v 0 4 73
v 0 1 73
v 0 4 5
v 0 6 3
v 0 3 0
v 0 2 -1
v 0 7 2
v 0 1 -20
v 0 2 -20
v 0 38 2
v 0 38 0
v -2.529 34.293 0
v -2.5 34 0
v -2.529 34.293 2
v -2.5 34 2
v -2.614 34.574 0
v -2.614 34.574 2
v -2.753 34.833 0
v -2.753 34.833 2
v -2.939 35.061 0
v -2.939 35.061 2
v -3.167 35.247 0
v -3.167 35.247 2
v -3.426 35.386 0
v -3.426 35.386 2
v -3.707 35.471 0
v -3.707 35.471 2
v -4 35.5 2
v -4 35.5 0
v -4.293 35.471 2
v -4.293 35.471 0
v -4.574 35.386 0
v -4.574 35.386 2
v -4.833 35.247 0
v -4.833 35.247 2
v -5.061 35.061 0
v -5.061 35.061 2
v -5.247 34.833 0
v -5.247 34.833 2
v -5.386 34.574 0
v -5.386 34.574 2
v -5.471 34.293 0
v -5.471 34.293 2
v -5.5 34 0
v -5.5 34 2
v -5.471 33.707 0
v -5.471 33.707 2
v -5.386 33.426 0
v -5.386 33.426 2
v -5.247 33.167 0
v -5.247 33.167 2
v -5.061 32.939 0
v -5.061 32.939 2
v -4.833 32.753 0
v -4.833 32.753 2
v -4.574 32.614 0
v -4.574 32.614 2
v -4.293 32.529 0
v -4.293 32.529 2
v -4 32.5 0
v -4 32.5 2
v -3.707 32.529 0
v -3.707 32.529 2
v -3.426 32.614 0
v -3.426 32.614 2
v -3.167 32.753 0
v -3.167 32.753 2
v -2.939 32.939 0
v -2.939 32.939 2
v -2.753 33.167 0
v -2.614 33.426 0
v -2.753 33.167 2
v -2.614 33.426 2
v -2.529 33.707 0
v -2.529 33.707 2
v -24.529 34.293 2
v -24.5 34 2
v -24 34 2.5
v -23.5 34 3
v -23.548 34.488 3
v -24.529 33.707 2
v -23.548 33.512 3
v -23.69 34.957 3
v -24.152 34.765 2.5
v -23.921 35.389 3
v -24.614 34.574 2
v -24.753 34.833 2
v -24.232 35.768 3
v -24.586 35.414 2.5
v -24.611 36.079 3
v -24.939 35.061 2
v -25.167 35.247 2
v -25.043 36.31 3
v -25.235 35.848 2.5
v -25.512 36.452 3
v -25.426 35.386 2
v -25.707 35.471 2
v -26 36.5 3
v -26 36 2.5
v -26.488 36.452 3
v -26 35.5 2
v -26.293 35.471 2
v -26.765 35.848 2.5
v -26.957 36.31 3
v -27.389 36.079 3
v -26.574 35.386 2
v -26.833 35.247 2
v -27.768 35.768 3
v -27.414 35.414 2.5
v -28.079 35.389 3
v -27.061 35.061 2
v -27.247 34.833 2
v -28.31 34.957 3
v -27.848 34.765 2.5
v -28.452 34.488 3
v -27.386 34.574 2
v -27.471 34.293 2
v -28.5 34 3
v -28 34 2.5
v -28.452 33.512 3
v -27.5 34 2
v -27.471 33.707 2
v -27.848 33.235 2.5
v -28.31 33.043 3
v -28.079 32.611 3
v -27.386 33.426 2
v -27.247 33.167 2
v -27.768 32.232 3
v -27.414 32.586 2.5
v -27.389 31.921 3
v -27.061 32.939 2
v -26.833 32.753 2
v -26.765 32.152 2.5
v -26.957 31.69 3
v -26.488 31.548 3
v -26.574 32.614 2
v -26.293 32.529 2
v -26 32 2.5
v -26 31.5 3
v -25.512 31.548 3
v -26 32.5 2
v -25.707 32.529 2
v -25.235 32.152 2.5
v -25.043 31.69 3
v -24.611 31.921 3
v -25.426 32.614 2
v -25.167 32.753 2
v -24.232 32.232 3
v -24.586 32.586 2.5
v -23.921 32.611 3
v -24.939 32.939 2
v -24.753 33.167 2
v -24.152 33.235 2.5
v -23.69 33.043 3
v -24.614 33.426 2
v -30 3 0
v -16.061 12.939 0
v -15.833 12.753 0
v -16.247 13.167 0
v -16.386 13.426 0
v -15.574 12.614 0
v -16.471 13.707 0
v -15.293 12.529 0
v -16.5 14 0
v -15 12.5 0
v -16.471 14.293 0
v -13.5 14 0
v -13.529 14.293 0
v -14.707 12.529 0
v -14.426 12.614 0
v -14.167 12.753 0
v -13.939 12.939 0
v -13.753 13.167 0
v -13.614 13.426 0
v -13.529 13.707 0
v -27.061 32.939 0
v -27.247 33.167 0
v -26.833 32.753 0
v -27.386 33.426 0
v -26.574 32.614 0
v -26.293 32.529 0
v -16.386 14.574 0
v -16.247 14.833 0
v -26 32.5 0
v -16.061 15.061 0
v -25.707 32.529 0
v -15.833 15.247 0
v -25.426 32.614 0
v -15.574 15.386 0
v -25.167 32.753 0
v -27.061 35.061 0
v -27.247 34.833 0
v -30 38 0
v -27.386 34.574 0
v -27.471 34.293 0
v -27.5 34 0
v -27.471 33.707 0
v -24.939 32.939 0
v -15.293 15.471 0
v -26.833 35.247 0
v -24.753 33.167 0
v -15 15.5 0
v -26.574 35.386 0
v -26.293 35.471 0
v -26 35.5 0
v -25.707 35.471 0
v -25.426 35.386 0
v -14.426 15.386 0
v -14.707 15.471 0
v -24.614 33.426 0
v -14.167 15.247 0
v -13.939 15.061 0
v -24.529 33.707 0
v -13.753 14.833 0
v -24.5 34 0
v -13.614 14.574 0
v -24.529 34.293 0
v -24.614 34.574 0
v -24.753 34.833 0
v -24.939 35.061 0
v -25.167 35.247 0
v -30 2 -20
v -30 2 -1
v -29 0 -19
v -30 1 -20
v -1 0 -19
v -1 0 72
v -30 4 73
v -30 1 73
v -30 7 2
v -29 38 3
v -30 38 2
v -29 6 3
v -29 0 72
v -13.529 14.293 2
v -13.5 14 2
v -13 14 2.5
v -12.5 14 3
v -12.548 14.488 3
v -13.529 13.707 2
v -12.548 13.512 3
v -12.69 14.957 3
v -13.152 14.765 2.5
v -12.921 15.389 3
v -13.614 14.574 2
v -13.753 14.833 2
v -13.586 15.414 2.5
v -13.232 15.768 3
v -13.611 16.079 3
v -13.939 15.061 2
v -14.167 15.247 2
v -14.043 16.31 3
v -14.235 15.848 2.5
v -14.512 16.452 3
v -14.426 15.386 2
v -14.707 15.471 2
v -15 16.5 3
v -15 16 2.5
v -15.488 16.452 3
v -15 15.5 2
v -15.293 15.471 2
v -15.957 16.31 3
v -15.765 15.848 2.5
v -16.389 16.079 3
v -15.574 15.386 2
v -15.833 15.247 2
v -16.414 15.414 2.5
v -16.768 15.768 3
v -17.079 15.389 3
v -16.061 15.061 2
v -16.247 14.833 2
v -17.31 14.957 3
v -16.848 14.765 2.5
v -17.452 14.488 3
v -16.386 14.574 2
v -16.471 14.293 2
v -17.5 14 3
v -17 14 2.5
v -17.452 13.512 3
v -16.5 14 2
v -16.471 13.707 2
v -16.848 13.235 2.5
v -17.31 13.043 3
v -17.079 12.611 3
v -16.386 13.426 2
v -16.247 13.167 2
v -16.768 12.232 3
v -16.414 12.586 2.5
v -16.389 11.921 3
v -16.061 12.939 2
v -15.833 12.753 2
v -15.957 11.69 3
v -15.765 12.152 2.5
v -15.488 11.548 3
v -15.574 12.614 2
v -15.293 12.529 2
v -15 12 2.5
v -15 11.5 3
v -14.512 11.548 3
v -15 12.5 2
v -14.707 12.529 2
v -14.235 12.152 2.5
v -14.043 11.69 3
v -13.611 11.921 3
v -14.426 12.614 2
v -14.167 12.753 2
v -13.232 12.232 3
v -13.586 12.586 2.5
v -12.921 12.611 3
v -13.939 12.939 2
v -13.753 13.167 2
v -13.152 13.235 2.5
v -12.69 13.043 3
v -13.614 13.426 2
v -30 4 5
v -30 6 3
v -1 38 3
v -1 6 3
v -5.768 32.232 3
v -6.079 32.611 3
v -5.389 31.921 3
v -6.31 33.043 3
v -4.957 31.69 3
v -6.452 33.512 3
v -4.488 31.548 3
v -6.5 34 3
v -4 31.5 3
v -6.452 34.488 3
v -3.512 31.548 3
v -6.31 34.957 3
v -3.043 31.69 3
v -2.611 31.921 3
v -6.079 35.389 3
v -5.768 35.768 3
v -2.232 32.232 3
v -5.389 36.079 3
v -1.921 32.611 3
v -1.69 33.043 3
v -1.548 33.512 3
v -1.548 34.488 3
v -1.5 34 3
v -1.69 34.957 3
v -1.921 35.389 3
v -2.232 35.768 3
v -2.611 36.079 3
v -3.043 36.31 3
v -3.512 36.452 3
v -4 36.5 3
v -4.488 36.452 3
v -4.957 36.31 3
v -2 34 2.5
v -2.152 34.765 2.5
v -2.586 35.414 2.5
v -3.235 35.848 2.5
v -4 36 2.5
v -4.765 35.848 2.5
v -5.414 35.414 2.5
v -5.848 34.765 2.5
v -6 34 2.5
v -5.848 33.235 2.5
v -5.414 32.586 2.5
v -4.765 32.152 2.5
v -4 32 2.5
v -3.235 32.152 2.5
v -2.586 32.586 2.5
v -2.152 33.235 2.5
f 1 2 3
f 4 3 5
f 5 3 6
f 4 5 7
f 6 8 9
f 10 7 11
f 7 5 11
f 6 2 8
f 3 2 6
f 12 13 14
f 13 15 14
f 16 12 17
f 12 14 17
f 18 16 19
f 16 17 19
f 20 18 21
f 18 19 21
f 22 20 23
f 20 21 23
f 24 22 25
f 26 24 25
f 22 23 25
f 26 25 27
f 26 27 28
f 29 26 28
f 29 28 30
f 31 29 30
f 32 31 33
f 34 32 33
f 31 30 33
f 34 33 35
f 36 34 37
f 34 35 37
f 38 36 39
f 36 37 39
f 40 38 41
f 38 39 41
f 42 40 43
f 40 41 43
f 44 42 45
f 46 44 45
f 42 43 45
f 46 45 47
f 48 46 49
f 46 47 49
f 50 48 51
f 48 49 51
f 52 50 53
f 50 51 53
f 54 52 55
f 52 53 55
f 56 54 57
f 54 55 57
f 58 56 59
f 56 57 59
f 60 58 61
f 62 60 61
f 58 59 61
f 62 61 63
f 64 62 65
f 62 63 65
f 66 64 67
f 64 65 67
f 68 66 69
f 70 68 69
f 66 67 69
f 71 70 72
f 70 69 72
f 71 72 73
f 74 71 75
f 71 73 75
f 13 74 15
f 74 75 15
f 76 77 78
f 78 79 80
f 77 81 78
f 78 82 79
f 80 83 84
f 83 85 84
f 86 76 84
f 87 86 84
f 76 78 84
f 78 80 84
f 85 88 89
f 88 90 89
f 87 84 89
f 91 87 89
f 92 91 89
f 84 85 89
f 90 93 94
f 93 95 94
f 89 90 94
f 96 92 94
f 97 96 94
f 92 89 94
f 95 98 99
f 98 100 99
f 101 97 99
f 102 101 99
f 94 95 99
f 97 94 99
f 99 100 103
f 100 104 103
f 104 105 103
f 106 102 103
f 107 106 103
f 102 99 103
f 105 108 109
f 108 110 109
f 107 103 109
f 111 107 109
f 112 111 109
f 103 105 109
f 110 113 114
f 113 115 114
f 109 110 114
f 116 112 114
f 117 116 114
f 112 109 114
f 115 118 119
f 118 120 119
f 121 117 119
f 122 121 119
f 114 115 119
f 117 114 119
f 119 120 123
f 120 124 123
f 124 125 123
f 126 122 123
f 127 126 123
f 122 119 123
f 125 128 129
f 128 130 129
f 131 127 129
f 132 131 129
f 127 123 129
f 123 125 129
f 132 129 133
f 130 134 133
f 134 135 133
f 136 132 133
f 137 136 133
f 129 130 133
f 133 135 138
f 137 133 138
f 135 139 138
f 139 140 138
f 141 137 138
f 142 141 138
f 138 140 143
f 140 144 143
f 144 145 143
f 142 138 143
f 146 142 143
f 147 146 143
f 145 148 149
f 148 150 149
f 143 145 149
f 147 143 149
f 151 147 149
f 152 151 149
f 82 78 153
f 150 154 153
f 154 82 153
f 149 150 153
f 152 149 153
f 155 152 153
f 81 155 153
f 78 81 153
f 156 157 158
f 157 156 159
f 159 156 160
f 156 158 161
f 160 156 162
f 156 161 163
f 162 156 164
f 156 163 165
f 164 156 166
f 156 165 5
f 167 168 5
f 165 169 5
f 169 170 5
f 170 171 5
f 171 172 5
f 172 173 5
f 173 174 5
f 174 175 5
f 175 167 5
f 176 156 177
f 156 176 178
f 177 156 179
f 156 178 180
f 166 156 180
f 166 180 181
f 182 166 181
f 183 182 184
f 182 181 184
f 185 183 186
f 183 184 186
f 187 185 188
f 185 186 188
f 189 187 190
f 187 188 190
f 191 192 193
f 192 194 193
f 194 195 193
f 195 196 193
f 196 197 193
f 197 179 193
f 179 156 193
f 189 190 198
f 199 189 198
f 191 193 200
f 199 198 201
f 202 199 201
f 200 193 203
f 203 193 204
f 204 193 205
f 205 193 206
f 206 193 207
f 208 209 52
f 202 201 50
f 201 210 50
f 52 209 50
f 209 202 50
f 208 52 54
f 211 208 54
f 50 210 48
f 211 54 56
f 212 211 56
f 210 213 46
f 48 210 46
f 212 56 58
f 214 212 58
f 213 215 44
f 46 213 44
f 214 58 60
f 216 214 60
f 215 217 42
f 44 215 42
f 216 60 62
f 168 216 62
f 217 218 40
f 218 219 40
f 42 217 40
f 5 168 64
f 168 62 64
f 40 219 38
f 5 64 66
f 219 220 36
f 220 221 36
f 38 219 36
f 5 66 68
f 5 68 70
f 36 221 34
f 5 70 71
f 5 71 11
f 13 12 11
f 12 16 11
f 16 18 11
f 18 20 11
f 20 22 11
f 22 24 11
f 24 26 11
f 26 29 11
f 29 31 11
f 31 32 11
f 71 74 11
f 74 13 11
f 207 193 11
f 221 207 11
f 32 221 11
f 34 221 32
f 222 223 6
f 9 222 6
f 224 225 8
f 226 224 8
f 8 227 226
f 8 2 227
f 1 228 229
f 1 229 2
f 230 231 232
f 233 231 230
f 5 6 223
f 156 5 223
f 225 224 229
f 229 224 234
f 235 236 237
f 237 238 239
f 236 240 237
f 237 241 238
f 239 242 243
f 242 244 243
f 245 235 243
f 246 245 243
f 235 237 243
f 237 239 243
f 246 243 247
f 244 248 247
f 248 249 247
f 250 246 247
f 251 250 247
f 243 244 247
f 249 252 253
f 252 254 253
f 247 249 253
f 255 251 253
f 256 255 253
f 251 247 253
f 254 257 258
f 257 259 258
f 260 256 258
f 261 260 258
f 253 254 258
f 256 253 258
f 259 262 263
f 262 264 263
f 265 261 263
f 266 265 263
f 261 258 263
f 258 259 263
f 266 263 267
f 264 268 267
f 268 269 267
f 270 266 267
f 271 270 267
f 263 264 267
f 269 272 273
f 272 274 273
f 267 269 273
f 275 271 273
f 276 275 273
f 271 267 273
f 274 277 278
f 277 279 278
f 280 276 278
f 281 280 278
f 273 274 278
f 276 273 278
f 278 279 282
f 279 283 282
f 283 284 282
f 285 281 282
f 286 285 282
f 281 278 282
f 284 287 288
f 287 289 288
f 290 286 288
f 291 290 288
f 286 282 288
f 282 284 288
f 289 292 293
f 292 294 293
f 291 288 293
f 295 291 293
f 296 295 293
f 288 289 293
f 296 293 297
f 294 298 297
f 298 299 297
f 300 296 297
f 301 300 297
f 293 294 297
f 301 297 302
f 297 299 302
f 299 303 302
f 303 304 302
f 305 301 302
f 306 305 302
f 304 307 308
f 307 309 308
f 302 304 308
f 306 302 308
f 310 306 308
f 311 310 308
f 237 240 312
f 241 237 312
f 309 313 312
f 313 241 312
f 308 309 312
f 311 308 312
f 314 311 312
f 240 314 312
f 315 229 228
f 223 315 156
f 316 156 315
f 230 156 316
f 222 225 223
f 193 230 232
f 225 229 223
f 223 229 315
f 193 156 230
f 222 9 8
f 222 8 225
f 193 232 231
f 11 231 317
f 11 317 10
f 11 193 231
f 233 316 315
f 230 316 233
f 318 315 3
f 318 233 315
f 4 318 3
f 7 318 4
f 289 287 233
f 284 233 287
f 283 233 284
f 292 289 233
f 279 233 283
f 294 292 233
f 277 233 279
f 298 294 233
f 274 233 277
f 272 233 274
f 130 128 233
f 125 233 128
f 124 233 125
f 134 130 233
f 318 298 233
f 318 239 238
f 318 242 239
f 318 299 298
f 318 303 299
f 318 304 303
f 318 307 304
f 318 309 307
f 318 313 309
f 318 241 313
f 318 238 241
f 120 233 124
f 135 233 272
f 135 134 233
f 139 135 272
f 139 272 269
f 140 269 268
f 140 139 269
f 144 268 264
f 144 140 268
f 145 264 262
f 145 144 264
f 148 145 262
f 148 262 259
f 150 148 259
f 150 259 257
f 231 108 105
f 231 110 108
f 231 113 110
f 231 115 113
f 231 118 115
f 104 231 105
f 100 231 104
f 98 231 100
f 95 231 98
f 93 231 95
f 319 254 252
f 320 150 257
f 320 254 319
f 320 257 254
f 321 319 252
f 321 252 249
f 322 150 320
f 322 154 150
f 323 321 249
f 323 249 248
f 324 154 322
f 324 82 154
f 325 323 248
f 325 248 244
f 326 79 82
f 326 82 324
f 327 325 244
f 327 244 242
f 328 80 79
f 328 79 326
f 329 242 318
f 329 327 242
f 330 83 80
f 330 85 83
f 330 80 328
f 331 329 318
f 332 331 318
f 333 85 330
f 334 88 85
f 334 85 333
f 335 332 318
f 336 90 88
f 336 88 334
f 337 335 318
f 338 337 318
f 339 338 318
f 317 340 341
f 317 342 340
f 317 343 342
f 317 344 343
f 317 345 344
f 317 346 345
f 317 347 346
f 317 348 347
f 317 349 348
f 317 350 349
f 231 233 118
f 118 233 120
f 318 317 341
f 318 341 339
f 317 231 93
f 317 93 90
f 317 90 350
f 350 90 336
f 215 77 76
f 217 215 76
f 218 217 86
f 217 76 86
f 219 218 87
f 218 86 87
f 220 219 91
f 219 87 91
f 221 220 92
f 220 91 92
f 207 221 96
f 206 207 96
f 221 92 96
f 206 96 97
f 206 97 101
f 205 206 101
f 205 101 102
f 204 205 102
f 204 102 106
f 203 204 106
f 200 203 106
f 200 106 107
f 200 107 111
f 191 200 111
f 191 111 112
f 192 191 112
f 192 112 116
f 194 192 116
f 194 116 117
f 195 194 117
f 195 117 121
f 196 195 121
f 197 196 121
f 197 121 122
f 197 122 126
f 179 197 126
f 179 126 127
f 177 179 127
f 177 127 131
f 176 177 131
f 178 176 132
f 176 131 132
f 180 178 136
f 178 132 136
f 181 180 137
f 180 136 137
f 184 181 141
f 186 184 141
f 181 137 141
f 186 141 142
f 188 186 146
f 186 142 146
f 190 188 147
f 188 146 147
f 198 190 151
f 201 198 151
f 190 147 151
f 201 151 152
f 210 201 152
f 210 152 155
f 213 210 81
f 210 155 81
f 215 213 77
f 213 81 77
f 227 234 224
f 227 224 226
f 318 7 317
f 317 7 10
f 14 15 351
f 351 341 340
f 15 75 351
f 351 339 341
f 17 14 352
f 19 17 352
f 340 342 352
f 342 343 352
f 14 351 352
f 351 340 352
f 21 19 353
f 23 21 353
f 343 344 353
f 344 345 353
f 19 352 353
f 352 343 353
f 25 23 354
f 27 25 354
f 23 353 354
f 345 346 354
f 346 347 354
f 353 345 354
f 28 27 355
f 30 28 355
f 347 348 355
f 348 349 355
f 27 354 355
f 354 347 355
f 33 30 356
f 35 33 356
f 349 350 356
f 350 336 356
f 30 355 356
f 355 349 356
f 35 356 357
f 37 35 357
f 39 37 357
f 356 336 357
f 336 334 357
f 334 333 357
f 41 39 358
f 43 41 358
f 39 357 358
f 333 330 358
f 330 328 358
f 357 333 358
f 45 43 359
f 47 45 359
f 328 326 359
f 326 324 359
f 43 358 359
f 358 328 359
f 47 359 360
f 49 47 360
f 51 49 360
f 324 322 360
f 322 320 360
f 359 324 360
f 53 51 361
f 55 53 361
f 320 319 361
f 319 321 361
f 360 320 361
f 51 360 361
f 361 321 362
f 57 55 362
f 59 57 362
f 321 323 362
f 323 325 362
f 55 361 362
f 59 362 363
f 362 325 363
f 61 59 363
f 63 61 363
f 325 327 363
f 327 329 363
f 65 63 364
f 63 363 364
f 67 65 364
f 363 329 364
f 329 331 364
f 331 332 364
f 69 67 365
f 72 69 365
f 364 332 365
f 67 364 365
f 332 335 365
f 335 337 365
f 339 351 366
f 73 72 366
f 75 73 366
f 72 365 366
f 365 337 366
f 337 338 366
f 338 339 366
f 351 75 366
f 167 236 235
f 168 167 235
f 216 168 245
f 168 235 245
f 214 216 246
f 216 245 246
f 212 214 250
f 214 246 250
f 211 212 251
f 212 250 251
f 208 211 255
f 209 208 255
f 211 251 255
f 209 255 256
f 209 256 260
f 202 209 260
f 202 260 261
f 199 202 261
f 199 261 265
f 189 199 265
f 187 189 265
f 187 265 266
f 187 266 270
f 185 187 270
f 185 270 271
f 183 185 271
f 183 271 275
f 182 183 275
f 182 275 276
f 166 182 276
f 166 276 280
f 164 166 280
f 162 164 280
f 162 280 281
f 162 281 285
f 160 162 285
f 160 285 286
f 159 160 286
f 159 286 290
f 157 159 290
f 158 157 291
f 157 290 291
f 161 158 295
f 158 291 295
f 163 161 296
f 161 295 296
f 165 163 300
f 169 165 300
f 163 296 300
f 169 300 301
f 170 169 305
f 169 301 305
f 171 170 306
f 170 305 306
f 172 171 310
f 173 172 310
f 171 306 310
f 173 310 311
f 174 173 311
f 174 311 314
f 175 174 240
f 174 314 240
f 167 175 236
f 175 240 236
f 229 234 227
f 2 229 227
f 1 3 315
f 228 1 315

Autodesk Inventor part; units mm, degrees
ref_plane "YZ Plane" through (0, 0, 0) normal (1, 0, 0) x (0, 1, 0)
ref_plane "XZ Plane" through (0, 0, 0) normal (0, 1, 0) x (-1, 0, 0)
ref_plane "XY Plane" through (0, 0, 0) normal (0, 0, 1) x (1, 0, 0)
sketch "Эскиз1" plane through (0, 0, 0) normal (0, 0, 1) x (1, 0, 0)
  line L0 (0, 0) -> (-30, 0)
  line L1 (-30, 0) -> (-30, 38)
  line L2 (-30, 38) -> (0, 38)
  line L3 (0, 38) -> (0, 0)
  dimension "d0" = 30
  dimension "d1" = 38
extrude "Выдавливание1" add sketch "Эскиз1" along normal blind 3
sketch "Эскиз2" plane through (0, 0, 0) normal (0, 0, -1) x (-1, 0, 0)
  line L0 (0, 0) -> (0, 38) projected
  line L1 (30, 38) -> (30, 0) projected
  line L2 (0, 0) -> (30, 0)
  line L3 (30, 0) -> (30, 2)
  line L4 (30, 2) -> (0, 2)
  line L5 (0, 2) -> (0, 0)
  point P0 (0, 2)
  dimension "d4" = 2
extrude "Выдавливание2" add sketch "Эскиз2" along normal blind 20
chamfer "Фаска1" distance 1 angle 45 1 edges at (-15, 2, 0)
sketch "Эскиз3" plane through (0, 0, 3) normal (0, 0, 1) x (1, 0, 0)
  circle A0 centre (-26, 34) radius 1.5
  circle A1 centre (-4, 34) radius 1.5
  circle A2 centre (-15, 14) radius 1.5
  line L0 (0, 38) -> (-30, 38) projected
  line L1 (-30, 38) -> (-30, 0) projected
  line L2 (0, 0) -> (0, 38) projected
  line L3 (-30, 0) -> (0, 0) projected
  dimension "d10" = 3
  dimension "d11" = 3
  dimension "d12" = 3
  dimension "d13" = 4
  dimension "d14" = 4
  dimension "d15" = 4
  dimension "d16" = 4
  dimension "d17" = 14
  dimension "d18" = 15
extrude "Выдавливание3" cut sketch "Эскиз3" against normal blind 20 contours A0 | A1 | A2
chamfer "Фаска2" distance 1 angle 45 3 edges at (-27.5, 34, 3) (-5.5, 34, 3) (-16.5, 14, 3)
sketch "Эскиз4" plane through (0, 0, 3) normal (0, 0, 1) x (1, 0, 0)
  line L0 (-30, 0) -> (-30, 2) projected
  line L1 (0, 0) -> (0, 38) projected
  line L2 (-30, 0) -> (0, 0)
  line L3 (0, 0) -> (0, 4)
  line L4 (0, 4) -> (-30, 4)
  line L5 (-30, 4) -> (-30, 0)
  dimension "d24" = 4
extrude "Выдавливание4" add sketch "Эскиз4" along normal blind 70
chamfer "Фаска3" distance 2 angle 45 1 edges at (-15, 4, 3)
chamfer "Фаска4" distance 1 angle 45 6 edges at (-30, 22, 3) (0, 22, 3) (-30, 0, 26.5) (-15, 0, 73) (0, 0, 26.5) (-15, 0, -20)
properties part number "camera"
